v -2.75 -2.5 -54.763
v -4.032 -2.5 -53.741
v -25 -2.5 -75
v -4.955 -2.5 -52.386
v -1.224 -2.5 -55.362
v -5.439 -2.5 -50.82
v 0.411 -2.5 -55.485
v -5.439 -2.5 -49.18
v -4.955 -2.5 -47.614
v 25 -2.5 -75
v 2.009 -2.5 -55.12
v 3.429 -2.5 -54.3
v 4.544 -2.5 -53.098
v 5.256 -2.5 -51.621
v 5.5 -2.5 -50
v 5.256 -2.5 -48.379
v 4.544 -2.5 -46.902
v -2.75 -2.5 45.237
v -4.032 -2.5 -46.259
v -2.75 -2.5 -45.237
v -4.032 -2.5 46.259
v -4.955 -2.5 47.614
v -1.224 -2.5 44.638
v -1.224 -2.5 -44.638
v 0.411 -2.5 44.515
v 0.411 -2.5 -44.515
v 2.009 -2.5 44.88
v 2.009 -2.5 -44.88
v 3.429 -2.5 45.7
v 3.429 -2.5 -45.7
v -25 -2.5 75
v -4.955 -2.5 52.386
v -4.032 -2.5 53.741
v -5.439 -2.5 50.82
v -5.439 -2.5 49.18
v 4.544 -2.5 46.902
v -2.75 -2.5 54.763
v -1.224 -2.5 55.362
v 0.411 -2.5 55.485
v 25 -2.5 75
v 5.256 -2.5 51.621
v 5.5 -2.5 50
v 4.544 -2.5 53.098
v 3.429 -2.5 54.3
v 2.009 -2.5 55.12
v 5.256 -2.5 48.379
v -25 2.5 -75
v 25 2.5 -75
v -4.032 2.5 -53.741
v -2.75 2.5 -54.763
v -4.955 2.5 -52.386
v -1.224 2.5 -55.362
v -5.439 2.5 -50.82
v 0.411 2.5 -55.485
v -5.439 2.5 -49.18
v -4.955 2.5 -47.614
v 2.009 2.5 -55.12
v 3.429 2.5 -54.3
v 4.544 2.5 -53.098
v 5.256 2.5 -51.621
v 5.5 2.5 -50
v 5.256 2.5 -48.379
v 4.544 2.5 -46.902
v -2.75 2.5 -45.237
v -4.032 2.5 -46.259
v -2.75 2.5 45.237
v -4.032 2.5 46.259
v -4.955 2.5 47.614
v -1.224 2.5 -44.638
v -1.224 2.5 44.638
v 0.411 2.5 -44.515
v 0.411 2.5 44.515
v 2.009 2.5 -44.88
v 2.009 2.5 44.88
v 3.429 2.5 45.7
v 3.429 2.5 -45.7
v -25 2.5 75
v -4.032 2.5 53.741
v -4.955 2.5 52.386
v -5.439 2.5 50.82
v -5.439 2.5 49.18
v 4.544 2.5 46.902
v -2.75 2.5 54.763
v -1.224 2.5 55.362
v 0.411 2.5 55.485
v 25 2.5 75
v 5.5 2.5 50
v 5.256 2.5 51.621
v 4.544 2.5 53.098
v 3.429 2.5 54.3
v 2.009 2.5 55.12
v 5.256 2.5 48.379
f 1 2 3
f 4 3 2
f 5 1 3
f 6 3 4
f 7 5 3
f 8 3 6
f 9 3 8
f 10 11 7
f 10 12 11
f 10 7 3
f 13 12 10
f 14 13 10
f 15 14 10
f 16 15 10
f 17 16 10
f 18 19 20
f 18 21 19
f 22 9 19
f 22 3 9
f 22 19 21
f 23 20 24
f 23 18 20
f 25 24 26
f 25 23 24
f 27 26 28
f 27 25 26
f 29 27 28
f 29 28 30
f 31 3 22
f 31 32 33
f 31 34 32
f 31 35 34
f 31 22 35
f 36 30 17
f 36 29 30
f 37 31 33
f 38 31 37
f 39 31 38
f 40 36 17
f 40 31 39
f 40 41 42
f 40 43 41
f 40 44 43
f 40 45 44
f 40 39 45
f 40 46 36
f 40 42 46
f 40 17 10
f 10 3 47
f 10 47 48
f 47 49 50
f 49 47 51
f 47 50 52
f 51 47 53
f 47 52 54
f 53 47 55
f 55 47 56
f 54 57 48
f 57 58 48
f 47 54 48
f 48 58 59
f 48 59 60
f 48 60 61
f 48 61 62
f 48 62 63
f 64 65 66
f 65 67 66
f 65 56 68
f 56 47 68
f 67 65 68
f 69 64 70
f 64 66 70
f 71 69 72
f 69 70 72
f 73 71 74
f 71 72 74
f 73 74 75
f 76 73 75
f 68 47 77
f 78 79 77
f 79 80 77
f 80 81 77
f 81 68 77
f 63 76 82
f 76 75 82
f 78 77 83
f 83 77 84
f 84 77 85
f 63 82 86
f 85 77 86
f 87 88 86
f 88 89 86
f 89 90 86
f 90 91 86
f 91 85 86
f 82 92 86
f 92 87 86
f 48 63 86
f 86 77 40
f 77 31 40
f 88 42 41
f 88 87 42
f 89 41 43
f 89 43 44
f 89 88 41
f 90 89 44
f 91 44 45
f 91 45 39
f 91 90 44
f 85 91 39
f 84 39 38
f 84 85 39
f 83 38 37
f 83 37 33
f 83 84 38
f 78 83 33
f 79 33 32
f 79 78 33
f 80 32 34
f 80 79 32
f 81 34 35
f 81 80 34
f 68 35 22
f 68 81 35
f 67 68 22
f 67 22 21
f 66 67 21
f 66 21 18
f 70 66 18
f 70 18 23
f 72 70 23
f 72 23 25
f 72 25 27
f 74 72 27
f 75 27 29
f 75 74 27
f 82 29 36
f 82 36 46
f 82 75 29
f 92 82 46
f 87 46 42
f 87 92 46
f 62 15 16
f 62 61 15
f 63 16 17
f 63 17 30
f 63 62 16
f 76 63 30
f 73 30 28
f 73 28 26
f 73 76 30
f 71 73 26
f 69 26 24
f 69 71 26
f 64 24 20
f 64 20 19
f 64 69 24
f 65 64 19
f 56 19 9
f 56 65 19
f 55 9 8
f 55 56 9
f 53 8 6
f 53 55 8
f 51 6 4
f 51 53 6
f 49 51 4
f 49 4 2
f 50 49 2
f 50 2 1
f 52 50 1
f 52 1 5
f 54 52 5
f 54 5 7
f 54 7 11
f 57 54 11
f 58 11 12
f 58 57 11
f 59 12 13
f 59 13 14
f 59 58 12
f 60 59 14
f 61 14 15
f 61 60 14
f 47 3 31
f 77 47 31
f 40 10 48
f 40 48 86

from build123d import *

# Parameters (mm, degrees)
F0_W     = 50
F0_H     = 150
F0_R     = 5.5
F1_DEPTH = 2.5


with BuildPart() as f1:
    # F0 (on Front) → F1 (new body, symmetric)
    with BuildSketch(Plane.XZ):
        Rectangle(F0_W, F0_H)
        with Locations((0, -50)):
            Circle(F0_R, mode=Mode.SUBTRACT)
        with Locations((0, 50)):
            Circle(F0_R, mode=Mode.SUBTRACT)
    extrude(amount=F1_DEPTH, both=True)


solid = f1.part
